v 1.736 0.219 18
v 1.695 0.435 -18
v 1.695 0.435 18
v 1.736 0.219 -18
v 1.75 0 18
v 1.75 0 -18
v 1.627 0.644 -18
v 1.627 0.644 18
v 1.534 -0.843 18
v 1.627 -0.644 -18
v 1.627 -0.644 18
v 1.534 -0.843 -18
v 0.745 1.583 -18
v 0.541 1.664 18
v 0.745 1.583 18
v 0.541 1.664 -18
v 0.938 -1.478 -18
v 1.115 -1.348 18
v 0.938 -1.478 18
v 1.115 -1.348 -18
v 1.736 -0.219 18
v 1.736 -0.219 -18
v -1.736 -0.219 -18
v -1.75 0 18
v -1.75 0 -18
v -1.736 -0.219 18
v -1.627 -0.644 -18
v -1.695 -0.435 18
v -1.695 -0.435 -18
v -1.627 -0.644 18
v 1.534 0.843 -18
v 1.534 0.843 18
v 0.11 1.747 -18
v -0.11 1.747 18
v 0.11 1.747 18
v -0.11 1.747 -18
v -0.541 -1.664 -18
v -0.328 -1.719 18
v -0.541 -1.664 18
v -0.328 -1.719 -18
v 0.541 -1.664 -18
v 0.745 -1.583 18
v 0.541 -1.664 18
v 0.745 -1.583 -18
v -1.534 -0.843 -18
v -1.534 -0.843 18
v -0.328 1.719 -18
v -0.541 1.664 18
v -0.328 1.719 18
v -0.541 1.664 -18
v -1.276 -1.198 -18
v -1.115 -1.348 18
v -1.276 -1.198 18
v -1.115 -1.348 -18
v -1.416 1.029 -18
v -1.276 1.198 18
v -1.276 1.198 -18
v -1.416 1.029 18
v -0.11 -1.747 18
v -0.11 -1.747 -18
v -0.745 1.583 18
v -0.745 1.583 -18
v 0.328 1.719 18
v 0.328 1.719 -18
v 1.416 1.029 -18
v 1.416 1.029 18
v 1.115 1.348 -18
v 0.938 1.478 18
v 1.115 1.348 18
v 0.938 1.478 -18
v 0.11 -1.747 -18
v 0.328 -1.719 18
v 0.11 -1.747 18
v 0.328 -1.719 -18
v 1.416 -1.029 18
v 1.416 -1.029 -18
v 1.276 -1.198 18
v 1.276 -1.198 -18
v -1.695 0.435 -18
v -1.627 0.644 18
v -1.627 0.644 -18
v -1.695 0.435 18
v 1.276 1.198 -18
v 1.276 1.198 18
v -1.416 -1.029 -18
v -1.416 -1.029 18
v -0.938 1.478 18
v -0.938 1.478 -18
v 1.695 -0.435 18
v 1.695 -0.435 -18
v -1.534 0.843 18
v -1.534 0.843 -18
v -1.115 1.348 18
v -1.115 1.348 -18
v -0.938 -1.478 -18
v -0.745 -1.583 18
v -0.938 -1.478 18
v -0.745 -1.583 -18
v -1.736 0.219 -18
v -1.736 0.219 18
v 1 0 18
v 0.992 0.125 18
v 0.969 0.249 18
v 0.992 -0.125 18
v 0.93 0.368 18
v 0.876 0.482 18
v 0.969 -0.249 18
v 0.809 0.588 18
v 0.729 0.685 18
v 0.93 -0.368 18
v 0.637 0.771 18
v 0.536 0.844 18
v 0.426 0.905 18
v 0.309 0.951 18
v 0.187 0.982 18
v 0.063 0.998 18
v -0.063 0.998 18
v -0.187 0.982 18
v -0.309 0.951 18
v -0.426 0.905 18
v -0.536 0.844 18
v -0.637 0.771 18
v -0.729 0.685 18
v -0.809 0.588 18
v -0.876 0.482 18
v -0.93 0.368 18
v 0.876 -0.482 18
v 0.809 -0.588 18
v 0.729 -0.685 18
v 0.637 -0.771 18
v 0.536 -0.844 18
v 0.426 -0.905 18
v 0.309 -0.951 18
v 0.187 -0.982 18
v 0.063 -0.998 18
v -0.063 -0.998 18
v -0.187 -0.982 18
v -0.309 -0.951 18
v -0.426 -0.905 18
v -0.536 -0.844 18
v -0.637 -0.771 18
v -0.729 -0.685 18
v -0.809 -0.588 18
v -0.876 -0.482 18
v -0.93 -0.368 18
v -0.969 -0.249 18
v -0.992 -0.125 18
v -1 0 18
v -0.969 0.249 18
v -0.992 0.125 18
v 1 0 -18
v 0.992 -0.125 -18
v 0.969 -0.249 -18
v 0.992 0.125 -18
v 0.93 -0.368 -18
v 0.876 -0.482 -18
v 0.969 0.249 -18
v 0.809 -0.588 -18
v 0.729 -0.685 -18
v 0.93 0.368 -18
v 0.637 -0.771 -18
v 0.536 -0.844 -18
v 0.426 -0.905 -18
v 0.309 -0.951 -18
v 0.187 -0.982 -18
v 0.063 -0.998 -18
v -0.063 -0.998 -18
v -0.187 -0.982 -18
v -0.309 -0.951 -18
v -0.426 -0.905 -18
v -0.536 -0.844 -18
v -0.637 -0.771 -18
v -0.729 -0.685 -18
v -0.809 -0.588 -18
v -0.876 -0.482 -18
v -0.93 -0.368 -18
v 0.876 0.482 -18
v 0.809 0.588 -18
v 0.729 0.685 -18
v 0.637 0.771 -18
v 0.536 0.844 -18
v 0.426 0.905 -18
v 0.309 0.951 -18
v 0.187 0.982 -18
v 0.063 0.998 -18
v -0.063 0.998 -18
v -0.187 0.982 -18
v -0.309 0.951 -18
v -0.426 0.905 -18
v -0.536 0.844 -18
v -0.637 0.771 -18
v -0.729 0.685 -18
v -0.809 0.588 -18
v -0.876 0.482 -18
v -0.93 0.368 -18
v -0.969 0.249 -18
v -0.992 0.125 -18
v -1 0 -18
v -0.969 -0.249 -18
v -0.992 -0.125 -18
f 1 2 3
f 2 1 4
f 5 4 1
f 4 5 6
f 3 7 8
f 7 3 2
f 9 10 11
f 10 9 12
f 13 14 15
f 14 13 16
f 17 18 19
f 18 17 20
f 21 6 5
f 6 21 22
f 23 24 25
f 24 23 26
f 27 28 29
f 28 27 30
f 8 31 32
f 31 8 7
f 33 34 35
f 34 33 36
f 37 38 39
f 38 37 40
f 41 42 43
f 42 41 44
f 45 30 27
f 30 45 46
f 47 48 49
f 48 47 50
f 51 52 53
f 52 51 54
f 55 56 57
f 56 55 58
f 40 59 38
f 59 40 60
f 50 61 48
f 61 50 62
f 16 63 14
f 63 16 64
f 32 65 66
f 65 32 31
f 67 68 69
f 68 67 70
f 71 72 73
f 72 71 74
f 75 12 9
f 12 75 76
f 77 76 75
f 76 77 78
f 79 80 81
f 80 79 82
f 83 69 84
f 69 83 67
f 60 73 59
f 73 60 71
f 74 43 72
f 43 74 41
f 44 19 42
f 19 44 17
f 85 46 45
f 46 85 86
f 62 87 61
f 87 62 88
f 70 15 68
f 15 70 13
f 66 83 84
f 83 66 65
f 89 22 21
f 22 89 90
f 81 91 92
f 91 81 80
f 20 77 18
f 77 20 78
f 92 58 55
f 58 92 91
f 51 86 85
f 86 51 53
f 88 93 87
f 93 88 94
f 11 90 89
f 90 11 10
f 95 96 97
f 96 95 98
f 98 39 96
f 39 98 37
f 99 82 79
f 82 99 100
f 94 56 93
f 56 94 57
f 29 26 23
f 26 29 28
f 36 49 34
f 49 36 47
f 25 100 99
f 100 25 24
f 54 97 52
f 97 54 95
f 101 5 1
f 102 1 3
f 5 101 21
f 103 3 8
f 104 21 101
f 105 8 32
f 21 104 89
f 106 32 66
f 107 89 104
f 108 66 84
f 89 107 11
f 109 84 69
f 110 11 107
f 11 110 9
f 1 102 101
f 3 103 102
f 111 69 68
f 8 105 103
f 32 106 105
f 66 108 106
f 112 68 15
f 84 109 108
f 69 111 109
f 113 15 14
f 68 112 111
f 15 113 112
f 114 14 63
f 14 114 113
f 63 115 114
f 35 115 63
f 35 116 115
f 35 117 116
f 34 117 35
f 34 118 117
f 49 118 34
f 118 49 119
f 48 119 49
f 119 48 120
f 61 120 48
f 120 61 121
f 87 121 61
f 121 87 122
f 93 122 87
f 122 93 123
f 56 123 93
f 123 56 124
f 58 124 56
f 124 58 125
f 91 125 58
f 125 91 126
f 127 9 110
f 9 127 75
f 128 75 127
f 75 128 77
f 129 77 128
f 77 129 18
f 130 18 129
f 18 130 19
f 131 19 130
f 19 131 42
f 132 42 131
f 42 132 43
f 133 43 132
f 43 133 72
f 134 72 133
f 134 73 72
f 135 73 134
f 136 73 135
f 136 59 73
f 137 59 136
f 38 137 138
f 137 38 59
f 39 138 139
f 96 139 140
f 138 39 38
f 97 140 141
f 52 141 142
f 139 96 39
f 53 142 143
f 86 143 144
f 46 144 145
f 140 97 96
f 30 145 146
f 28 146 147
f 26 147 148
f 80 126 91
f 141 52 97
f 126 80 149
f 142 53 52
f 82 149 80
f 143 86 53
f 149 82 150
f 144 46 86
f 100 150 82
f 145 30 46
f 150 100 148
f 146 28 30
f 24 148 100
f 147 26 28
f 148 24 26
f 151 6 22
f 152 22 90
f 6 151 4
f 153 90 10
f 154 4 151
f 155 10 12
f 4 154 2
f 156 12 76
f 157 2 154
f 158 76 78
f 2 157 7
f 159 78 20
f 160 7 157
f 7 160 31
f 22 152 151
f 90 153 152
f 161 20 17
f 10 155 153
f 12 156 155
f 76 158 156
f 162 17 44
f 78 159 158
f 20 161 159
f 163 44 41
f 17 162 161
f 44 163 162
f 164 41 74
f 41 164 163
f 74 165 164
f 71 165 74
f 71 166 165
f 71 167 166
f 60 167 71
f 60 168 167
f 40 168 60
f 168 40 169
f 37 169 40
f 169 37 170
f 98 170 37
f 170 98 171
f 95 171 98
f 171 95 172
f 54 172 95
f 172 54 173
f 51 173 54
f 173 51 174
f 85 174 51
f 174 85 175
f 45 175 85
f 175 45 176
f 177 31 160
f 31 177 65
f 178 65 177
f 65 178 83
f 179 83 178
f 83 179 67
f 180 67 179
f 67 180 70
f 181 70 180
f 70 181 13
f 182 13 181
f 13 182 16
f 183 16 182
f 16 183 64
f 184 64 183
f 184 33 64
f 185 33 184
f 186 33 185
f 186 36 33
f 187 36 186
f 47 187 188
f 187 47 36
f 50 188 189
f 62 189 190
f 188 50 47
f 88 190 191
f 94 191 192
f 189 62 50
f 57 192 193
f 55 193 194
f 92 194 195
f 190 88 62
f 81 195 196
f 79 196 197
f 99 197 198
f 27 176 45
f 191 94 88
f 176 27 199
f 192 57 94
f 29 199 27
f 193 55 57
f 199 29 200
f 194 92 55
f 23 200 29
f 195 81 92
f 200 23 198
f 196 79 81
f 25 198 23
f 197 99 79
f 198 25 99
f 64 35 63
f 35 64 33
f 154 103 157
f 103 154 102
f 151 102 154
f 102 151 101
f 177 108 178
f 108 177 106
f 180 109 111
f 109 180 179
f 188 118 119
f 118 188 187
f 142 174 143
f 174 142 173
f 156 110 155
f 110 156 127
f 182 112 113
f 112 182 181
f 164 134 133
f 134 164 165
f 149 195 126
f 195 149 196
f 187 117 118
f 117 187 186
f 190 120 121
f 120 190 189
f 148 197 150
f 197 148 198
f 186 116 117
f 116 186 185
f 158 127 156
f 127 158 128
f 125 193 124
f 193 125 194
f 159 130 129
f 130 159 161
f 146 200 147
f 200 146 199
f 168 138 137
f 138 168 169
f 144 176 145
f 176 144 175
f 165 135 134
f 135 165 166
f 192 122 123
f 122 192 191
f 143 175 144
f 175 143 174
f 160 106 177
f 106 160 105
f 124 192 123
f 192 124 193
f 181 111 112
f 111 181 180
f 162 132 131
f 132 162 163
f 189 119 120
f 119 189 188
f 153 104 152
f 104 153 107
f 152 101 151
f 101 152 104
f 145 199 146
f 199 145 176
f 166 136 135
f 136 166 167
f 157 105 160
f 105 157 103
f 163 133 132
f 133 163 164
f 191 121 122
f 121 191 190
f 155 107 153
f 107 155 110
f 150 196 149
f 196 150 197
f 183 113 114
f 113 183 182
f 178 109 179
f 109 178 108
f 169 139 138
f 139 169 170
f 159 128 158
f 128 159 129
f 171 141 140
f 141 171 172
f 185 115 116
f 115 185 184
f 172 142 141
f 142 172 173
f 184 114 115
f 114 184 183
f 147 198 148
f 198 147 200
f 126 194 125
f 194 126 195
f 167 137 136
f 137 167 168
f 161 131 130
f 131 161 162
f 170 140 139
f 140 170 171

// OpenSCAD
$fn = 50;


difference() {
	union() {
		translate(v = [0, 0, -18.0000000000]) {
			cylinder(h = 36, r = 1.7500000000);
		}
	}
	union() {
		translate(v = [0, 0, -100.0000000000]) {
			cylinder(h = 200, r = 1.0000000000);
		}
	}
}
